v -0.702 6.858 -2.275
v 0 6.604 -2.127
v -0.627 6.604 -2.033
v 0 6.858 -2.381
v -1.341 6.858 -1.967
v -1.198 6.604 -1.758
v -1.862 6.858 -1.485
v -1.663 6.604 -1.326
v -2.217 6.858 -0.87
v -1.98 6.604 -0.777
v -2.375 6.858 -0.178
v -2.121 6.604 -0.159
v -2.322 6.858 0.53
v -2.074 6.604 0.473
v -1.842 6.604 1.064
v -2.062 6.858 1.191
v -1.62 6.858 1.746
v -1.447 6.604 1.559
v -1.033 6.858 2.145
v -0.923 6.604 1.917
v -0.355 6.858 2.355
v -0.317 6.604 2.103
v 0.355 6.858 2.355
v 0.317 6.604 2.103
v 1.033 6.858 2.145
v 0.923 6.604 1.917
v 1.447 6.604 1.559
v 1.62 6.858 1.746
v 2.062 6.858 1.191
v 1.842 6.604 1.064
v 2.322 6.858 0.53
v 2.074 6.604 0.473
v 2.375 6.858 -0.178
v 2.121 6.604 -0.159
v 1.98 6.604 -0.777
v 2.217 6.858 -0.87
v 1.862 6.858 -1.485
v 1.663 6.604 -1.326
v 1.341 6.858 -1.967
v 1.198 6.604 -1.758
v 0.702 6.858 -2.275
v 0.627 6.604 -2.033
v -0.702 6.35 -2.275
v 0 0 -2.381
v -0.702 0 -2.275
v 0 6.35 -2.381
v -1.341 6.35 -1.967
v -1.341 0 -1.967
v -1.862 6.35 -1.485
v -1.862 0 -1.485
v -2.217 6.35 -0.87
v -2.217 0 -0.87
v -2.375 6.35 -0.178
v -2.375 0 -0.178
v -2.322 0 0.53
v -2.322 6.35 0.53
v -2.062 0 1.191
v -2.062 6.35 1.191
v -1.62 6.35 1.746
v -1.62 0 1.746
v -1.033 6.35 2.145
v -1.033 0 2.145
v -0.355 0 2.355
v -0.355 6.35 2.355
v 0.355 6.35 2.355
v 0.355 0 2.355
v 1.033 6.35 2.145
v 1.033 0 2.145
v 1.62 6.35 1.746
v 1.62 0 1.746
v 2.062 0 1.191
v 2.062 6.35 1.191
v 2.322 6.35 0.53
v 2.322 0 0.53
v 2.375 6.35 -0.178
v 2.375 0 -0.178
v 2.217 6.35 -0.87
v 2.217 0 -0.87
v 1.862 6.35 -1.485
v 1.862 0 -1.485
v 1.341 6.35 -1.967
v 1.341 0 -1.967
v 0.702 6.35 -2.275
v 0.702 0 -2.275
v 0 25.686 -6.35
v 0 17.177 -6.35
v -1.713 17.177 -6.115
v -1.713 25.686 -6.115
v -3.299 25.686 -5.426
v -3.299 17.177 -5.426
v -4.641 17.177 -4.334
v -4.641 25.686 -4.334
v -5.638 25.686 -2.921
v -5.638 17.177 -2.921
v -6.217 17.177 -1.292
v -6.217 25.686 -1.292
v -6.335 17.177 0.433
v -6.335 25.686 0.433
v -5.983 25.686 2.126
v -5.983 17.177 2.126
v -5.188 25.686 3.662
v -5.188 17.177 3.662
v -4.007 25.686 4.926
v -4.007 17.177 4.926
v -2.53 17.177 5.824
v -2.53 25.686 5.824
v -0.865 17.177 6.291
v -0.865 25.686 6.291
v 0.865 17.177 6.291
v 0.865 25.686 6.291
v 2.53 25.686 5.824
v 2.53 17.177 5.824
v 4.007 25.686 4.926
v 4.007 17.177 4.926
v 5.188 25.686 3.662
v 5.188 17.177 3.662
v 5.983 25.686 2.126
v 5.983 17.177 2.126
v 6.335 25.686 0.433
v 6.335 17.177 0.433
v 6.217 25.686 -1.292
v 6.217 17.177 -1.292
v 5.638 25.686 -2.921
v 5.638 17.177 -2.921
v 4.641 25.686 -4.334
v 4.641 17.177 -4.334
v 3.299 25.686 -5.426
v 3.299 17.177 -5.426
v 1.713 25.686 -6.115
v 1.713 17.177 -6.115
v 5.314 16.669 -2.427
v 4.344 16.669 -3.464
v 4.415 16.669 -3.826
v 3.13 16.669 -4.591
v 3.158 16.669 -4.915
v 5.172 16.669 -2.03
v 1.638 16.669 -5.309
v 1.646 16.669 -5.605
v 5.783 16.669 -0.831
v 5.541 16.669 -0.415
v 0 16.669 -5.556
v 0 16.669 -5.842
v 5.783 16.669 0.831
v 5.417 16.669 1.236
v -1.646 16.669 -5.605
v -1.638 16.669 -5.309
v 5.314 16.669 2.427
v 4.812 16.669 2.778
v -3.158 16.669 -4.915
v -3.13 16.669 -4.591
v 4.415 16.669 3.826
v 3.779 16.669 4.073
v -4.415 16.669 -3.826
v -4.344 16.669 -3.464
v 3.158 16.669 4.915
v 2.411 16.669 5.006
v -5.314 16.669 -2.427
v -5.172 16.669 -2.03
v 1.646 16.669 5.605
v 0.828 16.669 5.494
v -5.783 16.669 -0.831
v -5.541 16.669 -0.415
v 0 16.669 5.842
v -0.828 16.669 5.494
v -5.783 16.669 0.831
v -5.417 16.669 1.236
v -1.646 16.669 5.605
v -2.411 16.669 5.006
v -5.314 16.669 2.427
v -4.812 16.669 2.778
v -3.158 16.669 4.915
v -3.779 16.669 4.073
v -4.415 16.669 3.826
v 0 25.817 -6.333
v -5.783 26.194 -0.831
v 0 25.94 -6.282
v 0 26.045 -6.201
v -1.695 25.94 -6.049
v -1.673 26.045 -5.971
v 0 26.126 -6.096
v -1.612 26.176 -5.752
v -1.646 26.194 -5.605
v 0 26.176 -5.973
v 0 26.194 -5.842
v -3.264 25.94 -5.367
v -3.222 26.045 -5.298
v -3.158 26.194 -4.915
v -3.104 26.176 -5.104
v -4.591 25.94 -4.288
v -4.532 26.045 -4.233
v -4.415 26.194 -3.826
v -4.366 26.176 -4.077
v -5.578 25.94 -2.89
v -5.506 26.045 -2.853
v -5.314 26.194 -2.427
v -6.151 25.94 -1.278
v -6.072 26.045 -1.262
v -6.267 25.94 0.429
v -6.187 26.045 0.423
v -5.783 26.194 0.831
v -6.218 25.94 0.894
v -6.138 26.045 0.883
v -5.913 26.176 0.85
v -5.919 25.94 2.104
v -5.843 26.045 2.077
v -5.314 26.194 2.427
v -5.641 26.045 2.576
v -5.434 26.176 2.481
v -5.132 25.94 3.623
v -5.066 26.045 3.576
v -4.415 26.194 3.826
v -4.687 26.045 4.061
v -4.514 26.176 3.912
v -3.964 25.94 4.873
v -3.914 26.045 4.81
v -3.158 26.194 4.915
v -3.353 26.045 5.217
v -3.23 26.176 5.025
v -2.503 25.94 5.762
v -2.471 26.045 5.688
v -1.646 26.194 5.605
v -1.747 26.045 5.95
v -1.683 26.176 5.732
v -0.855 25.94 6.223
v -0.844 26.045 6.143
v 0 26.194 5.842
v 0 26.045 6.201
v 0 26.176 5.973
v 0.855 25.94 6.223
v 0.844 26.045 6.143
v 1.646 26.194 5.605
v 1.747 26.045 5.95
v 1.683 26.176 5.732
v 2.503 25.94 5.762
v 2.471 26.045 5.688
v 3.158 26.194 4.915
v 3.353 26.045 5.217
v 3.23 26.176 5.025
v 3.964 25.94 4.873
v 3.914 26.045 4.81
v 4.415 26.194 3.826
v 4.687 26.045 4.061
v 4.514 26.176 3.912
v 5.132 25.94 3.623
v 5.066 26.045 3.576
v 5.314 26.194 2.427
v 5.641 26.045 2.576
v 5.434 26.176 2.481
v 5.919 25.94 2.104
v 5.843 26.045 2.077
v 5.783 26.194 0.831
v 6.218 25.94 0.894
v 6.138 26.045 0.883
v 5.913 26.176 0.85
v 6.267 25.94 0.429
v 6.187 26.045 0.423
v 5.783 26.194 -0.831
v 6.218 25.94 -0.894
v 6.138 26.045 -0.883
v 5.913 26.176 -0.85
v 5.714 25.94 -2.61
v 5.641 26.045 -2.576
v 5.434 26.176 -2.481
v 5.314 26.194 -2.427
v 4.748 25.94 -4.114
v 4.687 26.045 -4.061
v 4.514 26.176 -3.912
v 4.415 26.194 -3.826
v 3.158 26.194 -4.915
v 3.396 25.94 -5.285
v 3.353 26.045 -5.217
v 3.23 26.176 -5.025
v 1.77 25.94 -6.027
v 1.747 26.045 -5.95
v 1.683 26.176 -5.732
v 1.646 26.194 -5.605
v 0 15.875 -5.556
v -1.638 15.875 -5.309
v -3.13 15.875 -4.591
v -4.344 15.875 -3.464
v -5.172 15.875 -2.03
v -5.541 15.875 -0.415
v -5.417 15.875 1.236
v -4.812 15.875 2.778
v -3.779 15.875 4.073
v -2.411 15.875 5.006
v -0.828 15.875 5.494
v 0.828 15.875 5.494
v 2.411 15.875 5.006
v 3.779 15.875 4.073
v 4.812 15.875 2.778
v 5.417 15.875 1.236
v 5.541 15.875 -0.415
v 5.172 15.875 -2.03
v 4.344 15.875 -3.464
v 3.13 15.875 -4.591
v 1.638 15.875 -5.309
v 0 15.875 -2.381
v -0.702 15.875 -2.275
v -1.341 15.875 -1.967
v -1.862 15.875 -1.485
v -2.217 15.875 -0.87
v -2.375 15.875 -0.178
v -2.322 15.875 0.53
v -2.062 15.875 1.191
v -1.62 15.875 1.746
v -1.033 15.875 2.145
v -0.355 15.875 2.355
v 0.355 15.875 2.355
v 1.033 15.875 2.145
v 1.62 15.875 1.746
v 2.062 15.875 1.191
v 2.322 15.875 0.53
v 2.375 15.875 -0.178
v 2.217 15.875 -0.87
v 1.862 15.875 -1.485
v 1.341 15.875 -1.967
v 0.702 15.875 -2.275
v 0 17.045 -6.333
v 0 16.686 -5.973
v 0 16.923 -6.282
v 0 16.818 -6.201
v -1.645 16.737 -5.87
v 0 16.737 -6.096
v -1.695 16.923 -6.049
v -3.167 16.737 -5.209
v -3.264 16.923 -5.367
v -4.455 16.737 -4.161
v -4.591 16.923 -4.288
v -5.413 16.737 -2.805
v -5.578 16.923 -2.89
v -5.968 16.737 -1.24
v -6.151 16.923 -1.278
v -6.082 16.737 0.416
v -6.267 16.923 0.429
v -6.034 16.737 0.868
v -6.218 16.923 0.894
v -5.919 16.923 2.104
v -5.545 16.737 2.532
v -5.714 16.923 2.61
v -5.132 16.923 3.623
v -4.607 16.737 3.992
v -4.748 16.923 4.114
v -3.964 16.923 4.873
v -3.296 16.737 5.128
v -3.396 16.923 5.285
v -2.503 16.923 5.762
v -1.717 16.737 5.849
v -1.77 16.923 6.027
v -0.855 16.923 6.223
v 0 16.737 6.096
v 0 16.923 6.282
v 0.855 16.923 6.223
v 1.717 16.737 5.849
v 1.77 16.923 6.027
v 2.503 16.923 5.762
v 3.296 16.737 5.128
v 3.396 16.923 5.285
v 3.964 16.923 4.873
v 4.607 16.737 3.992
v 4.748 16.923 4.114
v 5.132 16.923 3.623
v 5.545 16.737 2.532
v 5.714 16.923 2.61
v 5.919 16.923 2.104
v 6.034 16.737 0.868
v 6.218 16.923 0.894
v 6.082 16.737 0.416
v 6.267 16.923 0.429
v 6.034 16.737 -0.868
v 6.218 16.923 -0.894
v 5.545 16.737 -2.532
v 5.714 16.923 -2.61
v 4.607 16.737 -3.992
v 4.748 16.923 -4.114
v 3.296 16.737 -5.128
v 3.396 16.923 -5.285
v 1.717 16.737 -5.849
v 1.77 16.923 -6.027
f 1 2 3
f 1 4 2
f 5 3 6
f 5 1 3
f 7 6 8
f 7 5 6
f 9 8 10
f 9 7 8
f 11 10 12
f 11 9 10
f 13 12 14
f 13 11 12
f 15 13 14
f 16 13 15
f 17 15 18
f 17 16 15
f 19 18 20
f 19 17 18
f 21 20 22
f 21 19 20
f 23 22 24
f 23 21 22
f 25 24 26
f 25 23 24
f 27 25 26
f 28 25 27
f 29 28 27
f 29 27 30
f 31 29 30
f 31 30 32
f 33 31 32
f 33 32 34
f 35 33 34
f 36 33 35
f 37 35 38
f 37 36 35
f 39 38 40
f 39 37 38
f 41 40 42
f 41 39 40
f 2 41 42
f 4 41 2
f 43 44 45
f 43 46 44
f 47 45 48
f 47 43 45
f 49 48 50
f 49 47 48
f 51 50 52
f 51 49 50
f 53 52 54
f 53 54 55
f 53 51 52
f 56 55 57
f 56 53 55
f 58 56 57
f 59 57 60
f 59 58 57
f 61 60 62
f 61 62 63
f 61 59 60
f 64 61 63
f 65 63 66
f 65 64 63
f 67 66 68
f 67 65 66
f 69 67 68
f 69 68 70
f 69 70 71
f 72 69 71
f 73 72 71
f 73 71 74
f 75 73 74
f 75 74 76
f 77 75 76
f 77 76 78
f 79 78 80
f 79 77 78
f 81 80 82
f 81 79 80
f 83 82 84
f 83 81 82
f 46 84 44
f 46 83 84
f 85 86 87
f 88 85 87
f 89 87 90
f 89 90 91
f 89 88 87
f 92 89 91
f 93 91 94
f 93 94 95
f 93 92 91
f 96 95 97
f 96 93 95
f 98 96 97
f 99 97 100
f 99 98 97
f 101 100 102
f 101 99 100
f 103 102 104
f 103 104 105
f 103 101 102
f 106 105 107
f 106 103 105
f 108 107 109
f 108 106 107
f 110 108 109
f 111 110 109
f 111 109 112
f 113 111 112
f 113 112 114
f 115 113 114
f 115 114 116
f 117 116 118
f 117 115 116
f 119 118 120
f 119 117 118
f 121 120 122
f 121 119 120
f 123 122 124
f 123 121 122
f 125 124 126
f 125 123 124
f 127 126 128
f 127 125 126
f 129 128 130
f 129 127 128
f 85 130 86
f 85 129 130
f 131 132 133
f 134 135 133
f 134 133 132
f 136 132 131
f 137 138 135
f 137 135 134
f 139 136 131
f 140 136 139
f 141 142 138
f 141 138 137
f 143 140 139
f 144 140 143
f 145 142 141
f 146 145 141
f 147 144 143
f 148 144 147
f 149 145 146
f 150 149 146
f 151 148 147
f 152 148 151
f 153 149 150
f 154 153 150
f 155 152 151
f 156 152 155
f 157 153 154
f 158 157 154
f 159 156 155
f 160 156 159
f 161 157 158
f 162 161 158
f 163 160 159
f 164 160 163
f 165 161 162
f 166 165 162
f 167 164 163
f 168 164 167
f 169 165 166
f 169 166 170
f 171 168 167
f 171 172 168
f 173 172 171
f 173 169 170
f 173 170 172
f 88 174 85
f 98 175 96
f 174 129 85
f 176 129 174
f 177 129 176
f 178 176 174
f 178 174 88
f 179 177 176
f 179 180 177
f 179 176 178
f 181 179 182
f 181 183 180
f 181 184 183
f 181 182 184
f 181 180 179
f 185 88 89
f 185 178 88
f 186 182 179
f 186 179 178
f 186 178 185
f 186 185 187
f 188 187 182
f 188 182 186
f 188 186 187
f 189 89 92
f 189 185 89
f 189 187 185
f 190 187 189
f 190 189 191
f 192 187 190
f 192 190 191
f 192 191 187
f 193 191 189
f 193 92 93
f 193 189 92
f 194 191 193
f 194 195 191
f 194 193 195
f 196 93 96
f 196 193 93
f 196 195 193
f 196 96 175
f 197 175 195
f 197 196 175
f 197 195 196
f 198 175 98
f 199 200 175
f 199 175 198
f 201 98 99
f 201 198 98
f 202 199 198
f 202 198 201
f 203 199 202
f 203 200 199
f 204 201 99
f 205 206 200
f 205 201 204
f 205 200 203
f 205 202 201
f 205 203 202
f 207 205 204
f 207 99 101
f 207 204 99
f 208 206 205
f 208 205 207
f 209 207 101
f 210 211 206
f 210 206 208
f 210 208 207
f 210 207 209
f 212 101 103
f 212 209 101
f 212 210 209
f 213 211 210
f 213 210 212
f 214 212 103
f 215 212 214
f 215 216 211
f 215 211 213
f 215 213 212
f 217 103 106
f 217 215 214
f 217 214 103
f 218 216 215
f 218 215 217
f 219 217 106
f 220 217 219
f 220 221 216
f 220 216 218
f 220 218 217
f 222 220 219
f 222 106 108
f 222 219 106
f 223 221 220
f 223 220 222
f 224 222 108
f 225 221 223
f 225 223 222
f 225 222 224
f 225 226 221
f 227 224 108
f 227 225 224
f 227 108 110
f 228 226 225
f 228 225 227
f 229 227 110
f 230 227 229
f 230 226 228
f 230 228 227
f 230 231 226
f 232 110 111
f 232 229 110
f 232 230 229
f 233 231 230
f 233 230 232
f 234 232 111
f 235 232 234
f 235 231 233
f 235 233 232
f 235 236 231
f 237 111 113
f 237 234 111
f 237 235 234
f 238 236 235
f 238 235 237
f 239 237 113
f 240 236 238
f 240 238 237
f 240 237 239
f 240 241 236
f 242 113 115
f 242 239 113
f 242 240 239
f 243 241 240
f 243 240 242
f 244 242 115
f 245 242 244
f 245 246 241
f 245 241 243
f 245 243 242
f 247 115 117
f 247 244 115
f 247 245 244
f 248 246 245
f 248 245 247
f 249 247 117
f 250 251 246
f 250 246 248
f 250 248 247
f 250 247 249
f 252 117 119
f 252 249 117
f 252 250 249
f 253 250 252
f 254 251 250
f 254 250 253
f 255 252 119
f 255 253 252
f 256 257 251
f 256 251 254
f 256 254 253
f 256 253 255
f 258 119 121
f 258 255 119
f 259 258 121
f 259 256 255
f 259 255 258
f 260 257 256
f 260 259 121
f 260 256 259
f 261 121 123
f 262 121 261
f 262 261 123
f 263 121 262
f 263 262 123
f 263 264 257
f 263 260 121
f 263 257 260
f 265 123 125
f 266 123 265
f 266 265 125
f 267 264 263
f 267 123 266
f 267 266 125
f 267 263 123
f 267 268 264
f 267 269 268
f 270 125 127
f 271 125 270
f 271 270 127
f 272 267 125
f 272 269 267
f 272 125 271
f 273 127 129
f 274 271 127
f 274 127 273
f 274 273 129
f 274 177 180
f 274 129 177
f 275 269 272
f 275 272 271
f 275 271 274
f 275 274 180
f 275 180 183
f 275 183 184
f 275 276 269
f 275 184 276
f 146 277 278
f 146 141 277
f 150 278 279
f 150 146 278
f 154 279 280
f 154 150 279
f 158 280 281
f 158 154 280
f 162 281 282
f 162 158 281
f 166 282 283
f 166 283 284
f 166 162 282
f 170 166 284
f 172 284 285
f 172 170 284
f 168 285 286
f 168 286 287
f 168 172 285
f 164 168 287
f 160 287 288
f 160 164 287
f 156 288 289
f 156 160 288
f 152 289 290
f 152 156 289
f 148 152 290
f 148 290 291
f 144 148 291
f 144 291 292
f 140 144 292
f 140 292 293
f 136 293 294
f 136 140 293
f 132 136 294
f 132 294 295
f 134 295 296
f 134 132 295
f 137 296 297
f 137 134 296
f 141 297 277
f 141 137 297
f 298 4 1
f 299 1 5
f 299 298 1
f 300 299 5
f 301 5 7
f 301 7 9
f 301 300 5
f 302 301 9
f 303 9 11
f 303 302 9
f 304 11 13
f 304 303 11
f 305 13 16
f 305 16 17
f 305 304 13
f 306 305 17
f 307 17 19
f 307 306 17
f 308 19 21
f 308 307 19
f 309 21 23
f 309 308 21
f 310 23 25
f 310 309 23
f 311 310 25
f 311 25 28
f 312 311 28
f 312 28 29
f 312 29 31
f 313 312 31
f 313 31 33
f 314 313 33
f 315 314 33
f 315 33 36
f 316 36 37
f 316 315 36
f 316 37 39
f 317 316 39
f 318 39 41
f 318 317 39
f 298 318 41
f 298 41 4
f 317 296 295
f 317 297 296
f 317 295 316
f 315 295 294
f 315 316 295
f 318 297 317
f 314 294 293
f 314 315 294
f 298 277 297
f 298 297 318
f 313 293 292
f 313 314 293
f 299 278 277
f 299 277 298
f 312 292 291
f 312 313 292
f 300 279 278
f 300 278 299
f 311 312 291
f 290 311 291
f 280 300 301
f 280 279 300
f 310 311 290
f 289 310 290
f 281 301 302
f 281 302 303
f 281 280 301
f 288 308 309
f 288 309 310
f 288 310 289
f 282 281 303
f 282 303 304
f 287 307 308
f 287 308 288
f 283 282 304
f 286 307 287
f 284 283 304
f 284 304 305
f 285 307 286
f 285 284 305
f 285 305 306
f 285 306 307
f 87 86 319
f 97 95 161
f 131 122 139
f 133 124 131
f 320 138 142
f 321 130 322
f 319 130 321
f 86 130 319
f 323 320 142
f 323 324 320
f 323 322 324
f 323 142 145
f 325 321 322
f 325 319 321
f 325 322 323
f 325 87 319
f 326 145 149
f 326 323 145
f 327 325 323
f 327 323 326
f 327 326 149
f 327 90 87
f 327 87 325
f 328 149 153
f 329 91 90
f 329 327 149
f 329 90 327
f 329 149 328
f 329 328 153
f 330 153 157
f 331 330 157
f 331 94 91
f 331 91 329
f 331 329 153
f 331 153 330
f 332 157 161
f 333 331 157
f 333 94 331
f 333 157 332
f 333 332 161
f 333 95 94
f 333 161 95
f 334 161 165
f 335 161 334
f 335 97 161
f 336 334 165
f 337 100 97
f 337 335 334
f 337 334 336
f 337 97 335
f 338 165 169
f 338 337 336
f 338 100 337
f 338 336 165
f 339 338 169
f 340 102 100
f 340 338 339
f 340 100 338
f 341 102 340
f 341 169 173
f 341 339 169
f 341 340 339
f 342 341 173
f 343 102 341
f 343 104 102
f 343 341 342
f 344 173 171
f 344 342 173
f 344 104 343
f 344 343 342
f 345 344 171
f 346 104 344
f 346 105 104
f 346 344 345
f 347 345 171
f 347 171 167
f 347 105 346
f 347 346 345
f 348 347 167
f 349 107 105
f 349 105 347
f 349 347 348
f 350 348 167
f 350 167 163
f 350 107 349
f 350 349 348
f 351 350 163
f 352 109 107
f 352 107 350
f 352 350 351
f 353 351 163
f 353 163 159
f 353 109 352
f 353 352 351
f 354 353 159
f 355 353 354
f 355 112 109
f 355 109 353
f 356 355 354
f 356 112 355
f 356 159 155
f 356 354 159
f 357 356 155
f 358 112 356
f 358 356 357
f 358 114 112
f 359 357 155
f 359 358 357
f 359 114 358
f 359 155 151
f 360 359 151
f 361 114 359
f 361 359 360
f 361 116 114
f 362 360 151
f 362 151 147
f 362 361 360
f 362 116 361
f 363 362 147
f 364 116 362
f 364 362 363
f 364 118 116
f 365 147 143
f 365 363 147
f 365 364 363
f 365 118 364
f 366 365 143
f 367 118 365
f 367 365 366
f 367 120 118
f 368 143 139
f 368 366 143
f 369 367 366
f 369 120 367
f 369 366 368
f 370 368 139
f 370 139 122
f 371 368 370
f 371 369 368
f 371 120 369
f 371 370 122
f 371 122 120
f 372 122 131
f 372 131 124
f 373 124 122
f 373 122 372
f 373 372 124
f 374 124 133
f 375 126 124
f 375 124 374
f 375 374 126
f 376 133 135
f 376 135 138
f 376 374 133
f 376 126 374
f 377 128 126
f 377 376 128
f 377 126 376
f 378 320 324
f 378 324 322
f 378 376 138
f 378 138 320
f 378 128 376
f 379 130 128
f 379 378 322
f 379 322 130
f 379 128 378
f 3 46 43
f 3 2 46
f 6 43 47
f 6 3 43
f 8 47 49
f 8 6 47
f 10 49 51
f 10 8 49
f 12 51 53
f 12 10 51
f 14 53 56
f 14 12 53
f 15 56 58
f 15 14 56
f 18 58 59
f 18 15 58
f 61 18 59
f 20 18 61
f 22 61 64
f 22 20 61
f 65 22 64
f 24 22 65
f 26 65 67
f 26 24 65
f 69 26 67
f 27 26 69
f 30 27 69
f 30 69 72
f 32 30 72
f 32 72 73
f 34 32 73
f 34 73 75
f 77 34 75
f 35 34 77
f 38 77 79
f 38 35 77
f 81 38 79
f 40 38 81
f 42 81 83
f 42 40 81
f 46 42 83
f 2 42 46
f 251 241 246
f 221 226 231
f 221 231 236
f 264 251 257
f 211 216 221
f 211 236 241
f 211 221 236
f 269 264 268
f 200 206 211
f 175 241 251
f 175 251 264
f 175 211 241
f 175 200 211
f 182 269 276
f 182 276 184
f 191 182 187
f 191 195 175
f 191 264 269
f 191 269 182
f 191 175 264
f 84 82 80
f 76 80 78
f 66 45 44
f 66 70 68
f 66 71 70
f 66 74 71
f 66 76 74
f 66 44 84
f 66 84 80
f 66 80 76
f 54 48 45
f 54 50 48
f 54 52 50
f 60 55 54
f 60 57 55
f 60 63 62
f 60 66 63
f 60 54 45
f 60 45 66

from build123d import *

# Parameters (mm, degrees)
FILLET1_R = 0.508


with BuildPart() as part:
    # Sketch1 → Revolve1 (revolve)
    with BuildSketch(Plane.XY, mode=Mode.PRIVATE) as revolve1_sk:
        Polygon((0, 0), (2.38125, 0), (2.38125, 6.35), (2.12725, 6.604), (2.38125, 6.858), (2.38125, 15.875), (5.55625, 15.875), (5.55625, 16.66875), (6.35, 16.66875), (6.35, 26.19375), (0, 26.19375), align=None)
    revolve(revolve1_sk.sketch.rotate(Axis((0, 0, 0), (0, 1, 0)), 90), axis=Axis((0, 0, 0), (0, 1, 0)))  # turned: the seam where the file's is

    # Fillet1
    fillet1_edges = [part.edges().sort_by_distance(p)[0] for p in [
        (0, 26.19375, 6.35),
        (0, 16.66875, 6.35),
    ]]
    fillet(fillet1_edges, radius=FILLET1_R)


solid = part.part
